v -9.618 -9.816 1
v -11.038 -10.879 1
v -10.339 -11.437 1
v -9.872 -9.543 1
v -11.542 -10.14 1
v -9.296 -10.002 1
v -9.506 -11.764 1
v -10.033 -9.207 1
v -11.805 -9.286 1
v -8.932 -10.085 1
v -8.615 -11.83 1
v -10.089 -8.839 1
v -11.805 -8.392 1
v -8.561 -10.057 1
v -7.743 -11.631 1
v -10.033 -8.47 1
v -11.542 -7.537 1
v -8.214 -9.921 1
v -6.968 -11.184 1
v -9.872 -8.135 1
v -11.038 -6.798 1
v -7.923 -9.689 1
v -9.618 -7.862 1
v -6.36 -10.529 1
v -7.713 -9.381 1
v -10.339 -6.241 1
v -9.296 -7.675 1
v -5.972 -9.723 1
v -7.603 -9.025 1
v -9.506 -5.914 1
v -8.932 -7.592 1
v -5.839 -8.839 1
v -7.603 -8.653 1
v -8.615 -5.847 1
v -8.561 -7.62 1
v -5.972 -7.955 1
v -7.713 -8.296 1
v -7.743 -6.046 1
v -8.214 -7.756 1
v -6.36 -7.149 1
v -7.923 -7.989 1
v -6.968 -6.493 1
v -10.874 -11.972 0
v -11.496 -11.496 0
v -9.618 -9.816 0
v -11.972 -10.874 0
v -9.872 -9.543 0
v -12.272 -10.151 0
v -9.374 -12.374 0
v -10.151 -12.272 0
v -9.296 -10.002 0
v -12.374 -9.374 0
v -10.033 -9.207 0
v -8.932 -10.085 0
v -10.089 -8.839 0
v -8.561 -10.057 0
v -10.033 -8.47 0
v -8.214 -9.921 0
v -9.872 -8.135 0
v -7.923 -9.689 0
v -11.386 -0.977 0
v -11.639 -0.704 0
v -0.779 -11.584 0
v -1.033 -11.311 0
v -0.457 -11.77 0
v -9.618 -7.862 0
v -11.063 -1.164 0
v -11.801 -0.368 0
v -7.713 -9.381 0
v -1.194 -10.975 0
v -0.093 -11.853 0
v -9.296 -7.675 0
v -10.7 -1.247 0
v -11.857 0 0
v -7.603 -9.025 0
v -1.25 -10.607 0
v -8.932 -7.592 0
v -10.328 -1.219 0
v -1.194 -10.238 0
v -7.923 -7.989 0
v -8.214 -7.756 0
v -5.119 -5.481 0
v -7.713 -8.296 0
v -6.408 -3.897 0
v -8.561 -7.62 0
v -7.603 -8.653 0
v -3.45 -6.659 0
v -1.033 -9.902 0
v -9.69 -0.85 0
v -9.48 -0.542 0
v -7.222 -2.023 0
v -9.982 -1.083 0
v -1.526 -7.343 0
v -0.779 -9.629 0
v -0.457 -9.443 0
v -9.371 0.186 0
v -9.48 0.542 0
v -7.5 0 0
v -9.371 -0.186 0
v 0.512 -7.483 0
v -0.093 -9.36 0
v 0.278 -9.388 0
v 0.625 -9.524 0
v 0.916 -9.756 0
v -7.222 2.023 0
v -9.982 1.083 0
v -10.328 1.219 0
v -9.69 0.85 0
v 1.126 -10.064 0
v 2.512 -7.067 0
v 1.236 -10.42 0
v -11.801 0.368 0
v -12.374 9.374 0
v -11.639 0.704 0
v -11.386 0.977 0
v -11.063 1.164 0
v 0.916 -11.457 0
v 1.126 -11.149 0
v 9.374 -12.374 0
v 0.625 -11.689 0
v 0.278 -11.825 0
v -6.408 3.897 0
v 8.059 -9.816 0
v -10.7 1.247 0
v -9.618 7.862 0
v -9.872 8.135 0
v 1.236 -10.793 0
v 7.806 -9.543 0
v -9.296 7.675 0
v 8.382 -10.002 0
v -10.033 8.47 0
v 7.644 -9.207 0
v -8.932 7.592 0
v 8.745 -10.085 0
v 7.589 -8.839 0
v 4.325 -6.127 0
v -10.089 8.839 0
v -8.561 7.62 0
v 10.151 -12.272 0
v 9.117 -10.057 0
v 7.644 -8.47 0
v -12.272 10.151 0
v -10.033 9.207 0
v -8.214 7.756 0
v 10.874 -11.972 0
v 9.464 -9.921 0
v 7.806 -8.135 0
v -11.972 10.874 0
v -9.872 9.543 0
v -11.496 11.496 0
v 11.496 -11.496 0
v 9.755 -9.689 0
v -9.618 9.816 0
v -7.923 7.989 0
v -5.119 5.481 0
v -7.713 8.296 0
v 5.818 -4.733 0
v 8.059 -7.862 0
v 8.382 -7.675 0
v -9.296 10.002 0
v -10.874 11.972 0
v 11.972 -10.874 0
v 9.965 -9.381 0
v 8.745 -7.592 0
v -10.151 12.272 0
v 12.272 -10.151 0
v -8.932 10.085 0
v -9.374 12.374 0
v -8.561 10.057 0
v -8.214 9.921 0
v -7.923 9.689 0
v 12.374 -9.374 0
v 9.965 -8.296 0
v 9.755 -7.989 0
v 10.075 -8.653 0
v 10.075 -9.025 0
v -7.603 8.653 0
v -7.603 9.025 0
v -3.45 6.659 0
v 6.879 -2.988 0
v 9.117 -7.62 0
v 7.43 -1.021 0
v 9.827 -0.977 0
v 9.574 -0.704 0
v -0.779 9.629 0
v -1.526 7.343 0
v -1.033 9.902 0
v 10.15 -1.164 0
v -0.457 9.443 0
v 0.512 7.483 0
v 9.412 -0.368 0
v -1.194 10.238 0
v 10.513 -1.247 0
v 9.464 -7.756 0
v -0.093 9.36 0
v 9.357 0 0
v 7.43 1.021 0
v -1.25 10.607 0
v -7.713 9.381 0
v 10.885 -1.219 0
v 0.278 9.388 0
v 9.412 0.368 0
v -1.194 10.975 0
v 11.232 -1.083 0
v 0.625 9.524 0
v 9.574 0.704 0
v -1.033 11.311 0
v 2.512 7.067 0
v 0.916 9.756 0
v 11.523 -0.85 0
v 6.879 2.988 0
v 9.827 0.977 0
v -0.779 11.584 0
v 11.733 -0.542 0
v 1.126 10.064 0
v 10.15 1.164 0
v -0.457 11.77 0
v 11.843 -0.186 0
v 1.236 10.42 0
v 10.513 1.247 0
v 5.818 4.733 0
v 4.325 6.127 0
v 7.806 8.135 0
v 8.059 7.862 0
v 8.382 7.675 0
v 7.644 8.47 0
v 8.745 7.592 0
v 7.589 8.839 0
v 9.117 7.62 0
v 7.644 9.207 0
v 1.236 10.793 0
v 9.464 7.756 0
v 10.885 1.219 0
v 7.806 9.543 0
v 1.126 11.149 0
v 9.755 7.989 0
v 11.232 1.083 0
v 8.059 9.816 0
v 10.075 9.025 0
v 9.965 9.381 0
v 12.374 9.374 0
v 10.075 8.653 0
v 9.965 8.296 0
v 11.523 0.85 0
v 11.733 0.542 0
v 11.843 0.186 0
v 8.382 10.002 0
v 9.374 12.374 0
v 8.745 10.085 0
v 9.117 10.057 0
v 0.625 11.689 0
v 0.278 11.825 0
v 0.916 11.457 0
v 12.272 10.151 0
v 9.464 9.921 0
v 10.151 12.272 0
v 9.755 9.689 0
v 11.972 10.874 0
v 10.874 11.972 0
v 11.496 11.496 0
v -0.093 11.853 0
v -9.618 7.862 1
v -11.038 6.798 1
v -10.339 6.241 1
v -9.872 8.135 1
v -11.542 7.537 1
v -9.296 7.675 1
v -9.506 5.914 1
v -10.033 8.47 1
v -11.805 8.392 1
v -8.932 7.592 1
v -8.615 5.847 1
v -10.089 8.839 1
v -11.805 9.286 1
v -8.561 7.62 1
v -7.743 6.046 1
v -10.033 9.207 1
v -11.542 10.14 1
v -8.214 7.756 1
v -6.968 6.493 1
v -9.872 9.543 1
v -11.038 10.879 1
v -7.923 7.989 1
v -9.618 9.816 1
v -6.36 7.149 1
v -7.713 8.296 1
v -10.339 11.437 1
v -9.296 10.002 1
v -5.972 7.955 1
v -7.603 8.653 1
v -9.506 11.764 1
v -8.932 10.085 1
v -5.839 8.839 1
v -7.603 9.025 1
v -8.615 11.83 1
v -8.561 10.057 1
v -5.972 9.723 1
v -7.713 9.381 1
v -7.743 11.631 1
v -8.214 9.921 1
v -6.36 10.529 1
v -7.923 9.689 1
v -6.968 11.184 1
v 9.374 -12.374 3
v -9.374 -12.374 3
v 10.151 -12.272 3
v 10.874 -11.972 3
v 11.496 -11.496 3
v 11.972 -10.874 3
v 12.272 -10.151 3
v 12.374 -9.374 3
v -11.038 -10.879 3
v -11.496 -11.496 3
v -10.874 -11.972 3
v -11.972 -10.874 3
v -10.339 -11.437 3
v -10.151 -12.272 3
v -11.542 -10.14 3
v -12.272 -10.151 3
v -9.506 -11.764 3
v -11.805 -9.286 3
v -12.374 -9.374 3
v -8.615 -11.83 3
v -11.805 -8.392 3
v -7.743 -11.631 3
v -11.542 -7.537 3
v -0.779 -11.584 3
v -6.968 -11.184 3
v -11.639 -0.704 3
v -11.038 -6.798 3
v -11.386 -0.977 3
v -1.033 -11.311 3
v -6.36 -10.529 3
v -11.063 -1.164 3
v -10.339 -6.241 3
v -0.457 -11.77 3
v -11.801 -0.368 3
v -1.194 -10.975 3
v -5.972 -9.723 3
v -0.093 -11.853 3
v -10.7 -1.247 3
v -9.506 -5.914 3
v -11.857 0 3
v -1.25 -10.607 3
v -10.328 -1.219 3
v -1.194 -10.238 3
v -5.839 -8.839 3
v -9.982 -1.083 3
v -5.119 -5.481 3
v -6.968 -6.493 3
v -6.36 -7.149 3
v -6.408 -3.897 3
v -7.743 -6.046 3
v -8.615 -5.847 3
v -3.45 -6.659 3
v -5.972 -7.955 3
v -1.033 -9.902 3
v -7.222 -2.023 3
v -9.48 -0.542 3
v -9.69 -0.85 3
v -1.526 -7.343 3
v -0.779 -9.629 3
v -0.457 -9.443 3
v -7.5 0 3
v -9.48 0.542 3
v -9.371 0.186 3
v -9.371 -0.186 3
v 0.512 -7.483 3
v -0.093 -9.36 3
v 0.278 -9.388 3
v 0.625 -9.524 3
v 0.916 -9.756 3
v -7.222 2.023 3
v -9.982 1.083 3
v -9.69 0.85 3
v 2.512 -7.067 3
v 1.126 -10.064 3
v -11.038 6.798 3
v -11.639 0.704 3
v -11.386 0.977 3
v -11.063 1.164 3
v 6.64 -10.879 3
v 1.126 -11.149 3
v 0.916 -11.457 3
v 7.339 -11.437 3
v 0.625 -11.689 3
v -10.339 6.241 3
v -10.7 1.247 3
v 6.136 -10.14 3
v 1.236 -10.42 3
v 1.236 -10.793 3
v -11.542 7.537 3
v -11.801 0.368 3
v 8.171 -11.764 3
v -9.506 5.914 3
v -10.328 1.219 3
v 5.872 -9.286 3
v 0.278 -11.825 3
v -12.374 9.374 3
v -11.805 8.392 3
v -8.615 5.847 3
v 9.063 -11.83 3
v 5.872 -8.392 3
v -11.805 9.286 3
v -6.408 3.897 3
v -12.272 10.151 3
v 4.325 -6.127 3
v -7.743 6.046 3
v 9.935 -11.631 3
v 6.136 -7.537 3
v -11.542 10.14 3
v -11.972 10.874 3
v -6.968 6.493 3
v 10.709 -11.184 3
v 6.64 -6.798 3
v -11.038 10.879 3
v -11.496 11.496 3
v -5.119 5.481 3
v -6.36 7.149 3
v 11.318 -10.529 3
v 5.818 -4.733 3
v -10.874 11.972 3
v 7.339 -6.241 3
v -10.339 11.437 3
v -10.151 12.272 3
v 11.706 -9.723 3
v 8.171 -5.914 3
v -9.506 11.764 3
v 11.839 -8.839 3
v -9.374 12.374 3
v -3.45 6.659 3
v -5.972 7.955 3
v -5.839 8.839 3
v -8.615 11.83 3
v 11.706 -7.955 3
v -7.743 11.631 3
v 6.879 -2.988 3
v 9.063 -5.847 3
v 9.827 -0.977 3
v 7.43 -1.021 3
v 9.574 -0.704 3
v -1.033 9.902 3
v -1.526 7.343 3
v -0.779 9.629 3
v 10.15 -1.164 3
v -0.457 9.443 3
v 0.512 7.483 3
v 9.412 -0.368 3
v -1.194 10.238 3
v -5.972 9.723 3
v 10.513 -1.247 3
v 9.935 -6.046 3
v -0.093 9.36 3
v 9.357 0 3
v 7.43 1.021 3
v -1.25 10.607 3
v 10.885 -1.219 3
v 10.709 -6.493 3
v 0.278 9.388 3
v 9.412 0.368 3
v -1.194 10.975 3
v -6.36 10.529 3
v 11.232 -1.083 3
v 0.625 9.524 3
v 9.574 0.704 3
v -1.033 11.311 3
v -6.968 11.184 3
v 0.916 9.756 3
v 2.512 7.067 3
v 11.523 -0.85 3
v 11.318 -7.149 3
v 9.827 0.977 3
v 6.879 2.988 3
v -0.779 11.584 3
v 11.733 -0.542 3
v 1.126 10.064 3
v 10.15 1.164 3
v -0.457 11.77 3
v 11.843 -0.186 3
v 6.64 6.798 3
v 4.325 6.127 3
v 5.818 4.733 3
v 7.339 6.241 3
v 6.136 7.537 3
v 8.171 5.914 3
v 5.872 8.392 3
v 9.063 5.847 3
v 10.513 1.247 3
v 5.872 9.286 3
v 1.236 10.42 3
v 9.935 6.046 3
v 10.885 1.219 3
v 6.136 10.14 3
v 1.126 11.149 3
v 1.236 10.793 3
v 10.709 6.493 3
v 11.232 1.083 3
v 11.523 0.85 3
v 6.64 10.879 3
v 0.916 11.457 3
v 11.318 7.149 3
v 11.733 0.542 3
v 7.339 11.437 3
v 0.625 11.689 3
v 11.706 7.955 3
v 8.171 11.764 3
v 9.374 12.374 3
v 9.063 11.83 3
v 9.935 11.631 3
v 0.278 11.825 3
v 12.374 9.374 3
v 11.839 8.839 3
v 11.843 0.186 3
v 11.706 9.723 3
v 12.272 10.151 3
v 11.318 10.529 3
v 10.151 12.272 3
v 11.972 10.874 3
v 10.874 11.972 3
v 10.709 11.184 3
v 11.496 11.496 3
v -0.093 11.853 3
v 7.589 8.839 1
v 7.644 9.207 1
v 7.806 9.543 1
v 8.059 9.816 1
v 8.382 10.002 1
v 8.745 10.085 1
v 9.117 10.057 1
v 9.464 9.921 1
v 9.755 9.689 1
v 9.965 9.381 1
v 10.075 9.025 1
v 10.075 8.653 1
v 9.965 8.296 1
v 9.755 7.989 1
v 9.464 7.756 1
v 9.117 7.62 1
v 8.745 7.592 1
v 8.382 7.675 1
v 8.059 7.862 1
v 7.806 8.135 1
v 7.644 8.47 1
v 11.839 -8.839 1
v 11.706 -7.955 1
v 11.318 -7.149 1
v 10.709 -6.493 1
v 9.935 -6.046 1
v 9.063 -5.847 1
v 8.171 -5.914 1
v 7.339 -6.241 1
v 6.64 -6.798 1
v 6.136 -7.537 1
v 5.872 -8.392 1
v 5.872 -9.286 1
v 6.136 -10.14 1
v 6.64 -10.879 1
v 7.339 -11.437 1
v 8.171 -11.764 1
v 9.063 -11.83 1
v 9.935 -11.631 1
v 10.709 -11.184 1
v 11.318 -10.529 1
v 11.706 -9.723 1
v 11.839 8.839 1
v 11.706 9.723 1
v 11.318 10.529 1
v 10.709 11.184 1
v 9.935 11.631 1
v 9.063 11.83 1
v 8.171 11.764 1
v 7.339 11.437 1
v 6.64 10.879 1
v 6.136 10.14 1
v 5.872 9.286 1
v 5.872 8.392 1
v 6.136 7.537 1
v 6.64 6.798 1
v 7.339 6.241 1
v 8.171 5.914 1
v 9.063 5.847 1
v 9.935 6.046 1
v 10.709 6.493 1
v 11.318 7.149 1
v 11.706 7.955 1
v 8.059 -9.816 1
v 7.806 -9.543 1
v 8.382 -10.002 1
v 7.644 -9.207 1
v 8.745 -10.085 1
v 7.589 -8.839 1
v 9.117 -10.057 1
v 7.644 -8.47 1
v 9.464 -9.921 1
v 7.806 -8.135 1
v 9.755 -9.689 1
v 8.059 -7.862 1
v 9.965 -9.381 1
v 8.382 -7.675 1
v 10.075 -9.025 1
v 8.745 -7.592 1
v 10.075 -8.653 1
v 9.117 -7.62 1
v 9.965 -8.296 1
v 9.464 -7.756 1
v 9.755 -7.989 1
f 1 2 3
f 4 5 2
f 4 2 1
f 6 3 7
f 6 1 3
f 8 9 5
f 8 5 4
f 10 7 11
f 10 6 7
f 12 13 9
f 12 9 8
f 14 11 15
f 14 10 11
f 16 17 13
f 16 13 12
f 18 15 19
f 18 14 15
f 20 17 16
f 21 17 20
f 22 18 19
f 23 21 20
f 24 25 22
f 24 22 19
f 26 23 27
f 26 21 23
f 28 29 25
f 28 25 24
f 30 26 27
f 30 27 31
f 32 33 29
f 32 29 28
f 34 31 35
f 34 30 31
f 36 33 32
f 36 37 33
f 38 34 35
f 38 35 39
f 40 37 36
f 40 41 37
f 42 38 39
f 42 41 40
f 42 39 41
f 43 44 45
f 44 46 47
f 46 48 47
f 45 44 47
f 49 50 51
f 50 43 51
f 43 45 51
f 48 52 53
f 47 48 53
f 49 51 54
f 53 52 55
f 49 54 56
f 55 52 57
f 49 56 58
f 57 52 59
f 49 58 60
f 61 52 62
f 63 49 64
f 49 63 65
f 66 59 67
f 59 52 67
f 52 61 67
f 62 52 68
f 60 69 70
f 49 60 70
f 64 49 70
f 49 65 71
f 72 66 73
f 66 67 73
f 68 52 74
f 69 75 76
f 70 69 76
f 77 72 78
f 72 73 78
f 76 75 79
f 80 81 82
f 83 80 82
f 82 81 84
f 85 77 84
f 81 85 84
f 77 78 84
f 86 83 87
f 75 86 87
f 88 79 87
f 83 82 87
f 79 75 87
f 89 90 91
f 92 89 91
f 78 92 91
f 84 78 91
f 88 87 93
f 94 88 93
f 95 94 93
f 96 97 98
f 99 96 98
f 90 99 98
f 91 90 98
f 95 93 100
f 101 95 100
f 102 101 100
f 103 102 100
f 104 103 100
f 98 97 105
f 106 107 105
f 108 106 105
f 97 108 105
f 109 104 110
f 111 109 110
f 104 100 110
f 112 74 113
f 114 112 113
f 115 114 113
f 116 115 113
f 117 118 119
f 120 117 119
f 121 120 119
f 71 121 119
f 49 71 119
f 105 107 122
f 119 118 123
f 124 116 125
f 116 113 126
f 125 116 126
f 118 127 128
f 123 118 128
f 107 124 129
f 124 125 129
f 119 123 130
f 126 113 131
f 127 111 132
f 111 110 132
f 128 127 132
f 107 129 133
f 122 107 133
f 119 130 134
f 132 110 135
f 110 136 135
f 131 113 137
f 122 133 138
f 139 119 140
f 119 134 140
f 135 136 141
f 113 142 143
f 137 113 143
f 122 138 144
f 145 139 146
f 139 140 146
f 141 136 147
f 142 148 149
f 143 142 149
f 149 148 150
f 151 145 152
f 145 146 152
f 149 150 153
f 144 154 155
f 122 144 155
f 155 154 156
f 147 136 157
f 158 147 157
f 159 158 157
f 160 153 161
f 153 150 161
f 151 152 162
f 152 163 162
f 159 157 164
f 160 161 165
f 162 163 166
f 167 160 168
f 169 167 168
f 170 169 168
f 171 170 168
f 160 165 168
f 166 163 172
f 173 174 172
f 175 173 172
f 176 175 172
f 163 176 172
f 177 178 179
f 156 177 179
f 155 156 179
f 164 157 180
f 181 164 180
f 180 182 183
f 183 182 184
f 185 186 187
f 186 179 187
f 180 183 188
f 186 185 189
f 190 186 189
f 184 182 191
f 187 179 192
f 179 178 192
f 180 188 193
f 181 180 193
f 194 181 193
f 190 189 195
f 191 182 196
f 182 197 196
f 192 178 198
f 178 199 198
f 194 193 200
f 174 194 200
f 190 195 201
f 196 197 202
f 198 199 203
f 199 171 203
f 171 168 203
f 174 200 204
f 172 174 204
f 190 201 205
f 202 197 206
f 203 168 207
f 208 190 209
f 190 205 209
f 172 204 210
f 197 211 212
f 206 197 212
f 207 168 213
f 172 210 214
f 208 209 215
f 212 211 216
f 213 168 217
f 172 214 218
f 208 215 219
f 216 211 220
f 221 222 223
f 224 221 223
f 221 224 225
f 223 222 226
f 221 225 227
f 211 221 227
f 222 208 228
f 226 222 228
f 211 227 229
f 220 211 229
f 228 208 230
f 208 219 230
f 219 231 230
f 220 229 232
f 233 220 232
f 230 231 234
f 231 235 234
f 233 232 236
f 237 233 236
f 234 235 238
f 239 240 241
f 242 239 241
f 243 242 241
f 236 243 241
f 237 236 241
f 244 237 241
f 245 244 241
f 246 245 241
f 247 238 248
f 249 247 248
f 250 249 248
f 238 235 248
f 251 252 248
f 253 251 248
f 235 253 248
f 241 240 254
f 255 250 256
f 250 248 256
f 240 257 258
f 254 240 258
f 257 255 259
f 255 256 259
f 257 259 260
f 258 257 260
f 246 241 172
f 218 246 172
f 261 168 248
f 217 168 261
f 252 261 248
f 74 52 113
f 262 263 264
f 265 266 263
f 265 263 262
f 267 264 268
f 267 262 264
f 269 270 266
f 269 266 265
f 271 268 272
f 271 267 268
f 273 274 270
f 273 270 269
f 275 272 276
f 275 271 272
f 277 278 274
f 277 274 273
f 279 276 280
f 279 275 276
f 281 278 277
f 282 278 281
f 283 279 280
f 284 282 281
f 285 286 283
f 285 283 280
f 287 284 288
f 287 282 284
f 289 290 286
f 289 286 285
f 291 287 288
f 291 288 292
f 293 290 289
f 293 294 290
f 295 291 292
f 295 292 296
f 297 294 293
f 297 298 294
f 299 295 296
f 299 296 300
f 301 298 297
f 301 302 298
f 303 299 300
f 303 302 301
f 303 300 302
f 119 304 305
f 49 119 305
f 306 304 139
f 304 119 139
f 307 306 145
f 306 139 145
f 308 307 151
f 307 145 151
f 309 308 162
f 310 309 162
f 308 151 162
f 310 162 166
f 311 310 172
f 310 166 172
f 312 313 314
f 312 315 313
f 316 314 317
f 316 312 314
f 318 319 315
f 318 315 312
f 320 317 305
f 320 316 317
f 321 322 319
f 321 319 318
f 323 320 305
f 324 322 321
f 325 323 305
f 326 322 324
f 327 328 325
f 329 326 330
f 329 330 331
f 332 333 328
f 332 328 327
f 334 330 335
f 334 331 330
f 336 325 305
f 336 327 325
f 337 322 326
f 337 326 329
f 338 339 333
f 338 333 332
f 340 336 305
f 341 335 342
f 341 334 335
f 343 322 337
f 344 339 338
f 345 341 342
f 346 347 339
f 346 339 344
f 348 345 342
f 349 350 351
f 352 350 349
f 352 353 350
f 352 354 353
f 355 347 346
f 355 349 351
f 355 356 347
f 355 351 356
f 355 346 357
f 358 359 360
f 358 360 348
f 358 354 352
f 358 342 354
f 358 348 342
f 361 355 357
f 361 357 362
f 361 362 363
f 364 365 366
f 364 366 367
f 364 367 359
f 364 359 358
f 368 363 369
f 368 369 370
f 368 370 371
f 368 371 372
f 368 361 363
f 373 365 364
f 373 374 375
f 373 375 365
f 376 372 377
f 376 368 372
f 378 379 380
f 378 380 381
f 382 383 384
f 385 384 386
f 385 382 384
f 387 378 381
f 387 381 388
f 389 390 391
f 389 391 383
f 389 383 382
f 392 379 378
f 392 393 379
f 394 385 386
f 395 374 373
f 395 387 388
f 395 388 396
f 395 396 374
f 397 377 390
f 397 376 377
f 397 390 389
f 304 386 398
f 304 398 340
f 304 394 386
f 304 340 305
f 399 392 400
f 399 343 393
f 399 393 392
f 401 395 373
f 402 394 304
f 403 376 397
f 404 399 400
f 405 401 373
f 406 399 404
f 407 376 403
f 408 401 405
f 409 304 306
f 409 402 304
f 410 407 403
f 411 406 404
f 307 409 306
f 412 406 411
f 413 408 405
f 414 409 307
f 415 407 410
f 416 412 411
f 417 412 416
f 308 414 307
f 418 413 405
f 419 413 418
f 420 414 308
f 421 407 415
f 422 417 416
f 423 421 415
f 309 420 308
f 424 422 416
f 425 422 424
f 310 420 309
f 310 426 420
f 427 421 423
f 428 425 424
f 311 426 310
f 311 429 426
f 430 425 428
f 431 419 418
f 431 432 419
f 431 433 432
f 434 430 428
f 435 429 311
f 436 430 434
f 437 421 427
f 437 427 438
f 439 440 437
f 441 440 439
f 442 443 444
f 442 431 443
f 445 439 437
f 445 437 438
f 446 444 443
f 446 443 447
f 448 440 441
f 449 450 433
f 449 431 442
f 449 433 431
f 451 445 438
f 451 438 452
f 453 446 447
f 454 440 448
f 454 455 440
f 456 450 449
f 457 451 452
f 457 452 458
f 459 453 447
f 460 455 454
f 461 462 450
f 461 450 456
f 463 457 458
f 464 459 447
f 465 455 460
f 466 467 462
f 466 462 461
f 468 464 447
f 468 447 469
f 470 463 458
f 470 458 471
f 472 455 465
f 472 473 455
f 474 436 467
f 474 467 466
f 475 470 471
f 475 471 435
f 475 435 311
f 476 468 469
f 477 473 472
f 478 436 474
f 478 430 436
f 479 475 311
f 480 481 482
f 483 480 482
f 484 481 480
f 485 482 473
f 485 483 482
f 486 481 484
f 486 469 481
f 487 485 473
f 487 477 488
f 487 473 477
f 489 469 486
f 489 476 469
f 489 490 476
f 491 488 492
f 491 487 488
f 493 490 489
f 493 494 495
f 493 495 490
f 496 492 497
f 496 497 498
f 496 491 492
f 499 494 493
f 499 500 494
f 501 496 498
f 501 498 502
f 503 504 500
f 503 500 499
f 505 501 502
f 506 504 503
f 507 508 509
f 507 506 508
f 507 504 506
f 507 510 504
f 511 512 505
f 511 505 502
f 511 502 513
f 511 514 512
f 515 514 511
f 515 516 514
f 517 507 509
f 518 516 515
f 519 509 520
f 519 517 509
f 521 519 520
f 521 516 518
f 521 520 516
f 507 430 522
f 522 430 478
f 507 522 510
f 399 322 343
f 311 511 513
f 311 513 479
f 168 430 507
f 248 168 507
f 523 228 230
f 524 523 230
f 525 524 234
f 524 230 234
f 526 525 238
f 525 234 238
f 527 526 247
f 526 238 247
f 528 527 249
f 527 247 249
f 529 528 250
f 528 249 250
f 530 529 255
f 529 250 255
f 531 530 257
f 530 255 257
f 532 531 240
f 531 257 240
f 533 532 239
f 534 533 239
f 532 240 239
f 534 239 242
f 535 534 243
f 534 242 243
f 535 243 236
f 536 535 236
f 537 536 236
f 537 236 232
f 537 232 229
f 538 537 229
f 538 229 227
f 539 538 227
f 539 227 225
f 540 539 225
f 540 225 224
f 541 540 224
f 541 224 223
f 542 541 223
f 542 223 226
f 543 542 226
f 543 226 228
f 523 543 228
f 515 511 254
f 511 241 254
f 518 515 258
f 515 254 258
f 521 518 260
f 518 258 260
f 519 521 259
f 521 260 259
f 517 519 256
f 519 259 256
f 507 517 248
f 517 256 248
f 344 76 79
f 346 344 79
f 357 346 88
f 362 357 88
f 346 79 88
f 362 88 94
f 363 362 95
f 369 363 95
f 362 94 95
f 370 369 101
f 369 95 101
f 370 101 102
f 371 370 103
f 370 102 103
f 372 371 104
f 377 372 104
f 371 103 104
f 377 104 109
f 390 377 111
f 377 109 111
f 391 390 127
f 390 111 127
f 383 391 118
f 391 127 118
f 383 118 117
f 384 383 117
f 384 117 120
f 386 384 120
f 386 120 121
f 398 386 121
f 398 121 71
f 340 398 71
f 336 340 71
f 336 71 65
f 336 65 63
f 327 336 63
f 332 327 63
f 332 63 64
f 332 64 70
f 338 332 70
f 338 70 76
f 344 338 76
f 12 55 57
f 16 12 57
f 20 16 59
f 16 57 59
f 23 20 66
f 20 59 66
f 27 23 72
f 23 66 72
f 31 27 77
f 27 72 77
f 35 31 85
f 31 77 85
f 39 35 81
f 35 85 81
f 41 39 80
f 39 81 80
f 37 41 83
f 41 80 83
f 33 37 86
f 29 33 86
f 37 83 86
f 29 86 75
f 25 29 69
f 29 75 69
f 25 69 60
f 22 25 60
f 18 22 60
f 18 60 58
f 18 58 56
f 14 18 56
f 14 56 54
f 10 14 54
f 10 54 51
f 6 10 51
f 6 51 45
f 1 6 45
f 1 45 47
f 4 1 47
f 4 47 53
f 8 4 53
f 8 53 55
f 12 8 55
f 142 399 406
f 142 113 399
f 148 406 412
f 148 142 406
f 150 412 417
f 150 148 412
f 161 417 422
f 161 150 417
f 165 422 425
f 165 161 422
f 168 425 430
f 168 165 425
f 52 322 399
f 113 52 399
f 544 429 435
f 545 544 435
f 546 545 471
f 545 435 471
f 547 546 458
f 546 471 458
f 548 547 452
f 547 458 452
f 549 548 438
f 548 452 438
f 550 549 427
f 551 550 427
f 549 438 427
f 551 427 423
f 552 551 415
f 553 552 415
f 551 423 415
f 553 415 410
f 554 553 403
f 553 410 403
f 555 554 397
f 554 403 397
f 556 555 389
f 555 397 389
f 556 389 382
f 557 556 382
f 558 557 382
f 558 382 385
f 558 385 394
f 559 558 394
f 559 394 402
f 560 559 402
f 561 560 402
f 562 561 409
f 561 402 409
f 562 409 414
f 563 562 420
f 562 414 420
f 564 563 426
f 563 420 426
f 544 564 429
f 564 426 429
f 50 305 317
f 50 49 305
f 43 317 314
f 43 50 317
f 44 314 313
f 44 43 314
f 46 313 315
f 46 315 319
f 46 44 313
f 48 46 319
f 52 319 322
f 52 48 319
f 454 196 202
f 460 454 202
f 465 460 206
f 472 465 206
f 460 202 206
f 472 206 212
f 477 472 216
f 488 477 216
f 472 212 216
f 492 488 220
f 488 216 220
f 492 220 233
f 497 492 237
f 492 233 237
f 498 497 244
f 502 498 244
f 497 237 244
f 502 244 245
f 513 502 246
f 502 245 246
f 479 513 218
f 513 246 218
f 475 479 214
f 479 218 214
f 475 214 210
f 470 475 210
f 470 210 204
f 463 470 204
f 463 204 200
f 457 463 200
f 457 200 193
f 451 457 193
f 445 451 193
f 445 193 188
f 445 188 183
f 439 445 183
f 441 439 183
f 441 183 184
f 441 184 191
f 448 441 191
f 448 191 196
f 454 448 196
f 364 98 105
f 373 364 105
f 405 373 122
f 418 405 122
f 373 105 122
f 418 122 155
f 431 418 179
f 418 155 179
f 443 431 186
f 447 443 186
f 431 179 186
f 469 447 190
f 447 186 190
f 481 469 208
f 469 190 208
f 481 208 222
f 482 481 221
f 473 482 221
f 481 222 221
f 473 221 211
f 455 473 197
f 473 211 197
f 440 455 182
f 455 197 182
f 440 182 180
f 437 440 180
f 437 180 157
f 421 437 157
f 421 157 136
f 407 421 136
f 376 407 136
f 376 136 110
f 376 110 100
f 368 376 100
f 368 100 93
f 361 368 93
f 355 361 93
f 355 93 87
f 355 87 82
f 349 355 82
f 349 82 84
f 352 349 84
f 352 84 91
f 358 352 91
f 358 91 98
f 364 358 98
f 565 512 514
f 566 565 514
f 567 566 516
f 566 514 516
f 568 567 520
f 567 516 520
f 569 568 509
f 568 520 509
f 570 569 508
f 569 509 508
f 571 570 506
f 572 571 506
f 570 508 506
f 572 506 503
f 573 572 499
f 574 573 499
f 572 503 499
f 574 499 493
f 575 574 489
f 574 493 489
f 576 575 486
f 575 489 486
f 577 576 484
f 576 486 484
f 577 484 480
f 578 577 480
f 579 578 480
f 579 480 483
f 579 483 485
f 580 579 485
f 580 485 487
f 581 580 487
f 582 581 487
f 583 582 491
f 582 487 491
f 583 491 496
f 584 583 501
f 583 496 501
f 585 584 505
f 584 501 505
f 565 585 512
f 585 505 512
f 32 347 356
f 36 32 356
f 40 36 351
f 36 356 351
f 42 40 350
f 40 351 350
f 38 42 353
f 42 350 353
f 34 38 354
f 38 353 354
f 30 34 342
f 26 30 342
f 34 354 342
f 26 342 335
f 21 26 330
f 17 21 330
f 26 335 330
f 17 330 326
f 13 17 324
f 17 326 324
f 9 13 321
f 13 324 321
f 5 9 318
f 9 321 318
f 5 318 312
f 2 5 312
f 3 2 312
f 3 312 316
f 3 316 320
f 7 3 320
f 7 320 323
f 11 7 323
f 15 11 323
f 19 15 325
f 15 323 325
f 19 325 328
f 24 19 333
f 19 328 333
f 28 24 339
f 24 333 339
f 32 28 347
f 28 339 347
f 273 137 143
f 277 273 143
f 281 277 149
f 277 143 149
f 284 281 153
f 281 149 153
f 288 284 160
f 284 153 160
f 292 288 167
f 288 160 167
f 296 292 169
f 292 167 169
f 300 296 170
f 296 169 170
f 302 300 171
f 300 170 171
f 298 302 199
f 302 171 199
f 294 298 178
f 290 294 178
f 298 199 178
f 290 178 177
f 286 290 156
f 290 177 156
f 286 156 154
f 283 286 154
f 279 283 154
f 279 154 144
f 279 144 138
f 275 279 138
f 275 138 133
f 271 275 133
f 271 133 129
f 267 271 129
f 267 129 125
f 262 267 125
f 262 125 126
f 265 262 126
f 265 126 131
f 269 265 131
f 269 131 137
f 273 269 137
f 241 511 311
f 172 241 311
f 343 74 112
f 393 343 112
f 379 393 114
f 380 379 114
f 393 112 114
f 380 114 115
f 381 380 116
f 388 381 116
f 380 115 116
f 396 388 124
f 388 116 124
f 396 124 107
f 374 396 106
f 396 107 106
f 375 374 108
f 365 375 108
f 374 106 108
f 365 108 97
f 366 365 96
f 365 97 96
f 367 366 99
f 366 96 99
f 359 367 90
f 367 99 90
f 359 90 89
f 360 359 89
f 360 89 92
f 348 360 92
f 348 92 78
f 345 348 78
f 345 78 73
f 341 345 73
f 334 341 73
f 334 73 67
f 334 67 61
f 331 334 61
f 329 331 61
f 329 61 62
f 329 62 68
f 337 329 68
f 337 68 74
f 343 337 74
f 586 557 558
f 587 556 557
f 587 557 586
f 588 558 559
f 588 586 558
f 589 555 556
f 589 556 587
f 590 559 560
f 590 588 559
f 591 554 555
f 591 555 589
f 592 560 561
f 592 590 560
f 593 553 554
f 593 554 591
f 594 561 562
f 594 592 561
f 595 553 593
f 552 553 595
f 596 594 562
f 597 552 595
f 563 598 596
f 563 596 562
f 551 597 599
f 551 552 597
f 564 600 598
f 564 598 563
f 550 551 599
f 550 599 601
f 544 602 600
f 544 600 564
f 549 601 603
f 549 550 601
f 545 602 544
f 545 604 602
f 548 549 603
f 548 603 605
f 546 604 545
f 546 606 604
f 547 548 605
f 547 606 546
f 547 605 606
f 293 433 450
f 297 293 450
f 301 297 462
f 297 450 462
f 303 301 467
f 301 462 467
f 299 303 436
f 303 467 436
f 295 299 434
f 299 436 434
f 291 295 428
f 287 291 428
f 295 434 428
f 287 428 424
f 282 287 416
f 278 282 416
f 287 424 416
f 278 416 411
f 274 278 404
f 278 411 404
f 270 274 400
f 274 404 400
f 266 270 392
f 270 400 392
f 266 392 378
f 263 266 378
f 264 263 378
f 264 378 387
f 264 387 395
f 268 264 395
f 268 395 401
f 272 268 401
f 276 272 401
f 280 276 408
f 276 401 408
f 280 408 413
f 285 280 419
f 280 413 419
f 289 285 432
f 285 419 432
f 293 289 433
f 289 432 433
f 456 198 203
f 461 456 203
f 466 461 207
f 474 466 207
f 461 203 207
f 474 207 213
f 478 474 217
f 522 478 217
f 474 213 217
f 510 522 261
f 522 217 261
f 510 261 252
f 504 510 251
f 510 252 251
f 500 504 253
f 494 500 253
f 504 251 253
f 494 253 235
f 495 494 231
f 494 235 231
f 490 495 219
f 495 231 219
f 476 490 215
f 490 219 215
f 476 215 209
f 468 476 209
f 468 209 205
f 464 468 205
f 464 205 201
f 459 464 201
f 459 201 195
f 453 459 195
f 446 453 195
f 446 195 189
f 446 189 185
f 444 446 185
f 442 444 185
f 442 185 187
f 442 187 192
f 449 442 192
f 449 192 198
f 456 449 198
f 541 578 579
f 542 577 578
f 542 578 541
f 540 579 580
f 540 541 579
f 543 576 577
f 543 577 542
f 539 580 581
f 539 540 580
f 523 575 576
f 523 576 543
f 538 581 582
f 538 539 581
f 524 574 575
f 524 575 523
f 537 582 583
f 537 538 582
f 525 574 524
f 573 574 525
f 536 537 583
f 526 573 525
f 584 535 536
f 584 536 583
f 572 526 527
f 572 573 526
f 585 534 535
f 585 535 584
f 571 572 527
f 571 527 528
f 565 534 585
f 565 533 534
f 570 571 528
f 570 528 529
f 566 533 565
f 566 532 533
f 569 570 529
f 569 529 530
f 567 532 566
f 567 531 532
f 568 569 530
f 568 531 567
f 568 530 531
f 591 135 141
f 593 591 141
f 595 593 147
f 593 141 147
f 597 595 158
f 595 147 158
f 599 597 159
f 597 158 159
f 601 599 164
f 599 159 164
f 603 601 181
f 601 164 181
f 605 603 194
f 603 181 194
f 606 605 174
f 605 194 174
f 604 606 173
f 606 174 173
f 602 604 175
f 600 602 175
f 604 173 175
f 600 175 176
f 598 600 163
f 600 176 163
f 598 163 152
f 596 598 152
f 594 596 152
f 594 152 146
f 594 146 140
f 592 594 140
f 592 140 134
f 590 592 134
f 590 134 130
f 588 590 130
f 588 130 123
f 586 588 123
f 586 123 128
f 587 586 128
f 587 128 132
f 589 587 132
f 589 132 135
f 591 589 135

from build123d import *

# Parameters (mm, degrees)
SKETCH_1_R          = 17.5
EXTRUDE_1_DEPTH     = 3
CUT_EXTRUDE_1_REACH = 26.93
SKETCH_2_R          = 1.25
CUT_EXTRUDE_2_REACH = 26.93
SKETCH_3_R          = 1.25
CUT_EXTRUDE_3_REACH = 26.93
SKETCH_4_R          = 7.5
CUT_EXTRUDE_4_REACH = 26.93
FILLET_1_R          = 3
SKETCH_8_R          = 3
CUT_EXTRUDE_5_DEPTH = 2


with BuildPart() as part:
    # 草图1 → 凸台-拉伸1 (new body)
    with BuildSketch(Plane.XY):
        Circle(SKETCH_1_R)
    extrude(amount=EXTRUDE_1_DEPTH)

    # 草图2 → 切除-拉伸1 (cut, up to next)
    with BuildSketch(Plane(origin=(0, 0, 0), x_dir=(-1, 0, 0), z_dir=(0, 0, -1)), mode=Mode.PRIVATE) as cut_extrude_1_sk1:
        with Locations((-8.838834765, 8.838834765)):
            Circle(SKETCH_2_R)
    cut_extrude_1_tool1 = extrude(cut_extrude_1_sk1.sketch, amount=-CUT_EXTRUDE_1_REACH, mode=Mode.PRIVATE) & part.part
    # 草图2 → 切除-拉伸1 (cut, up to next)
    with BuildSketch(Plane(origin=(0, 0, 0), x_dir=(-1, 0, 0), z_dir=(0, 0, -1)), mode=Mode.PRIVATE) as cut_extrude_1_sk2:
        with Locations((8.838834765, 8.838834765)):
            Circle(SKETCH_2_R)
    cut_extrude_1_tool2 = extrude(cut_extrude_1_sk2.sketch, amount=-CUT_EXTRUDE_1_REACH, mode=Mode.PRIVATE) & part.part
    # 草图2 → 切除-拉伸1 (cut, up to next)
    with BuildSketch(Plane(origin=(0, 0, 0), x_dir=(-1, 0, 0), z_dir=(0, 0, -1)), mode=Mode.PRIVATE) as cut_extrude_1_sk3:
        with Locations((8.838834765, -8.838834765)):
            Circle(SKETCH_2_R)
    cut_extrude_1_tool3 = extrude(cut_extrude_1_sk3.sketch, amount=-CUT_EXTRUDE_1_REACH, mode=Mode.PRIVATE) & part.part
    # 草图2 → 切除-拉伸1 (cut, up to next)
    with BuildSketch(Plane(origin=(0, 0, 0), x_dir=(-1, 0, 0), z_dir=(0, 0, -1)), mode=Mode.PRIVATE) as cut_extrude_1_sk4:
        with Locations((-8.838834765, -8.838834765)):
            Circle(SKETCH_2_R)
    cut_extrude_1_tool4 = extrude(cut_extrude_1_sk4.sketch, amount=-CUT_EXTRUDE_1_REACH, mode=Mode.PRIVATE) & part.part
    add(cut_extrude_1_tool1.solids().sort_by_distance((8.838835, 8.838835, 0))[0], mode=Mode.SUBTRACT)
    add(cut_extrude_1_tool2.solids().sort_by_distance((-8.838835, 8.838835, 0))[0], mode=Mode.SUBTRACT)
    add(cut_extrude_1_tool3.solids().sort_by_distance((-8.838835, -8.838835, 0))[0], mode=Mode.SUBTRACT)
    add(cut_extrude_1_tool4.solids().sort_by_distance((8.838835, -8.838835, 0))[0], mode=Mode.SUBTRACT)

    # 草图3 → 切除-拉伸2 (cut, up to next)
    with BuildSketch(Plane(origin=(0, 0, 0), x_dir=(-1, 0, 0), z_dir=(0, 0, -1)), mode=Mode.PRIVATE) as cut_extrude_2_sk1:
        with Locations((0, 10.606601718)):
            Circle(SKETCH_3_R)
    cut_extrude_2_tool1 = extrude(cut_extrude_2_sk1.sketch, amount=-CUT_EXTRUDE_2_REACH, mode=Mode.PRIVATE) & part.part
    # 草图3 → 切除-拉伸2 (cut, up to next)
    with BuildSketch(Plane(origin=(0, 0, 0), x_dir=(-1, 0, 0), z_dir=(0, 0, -1)), mode=Mode.PRIVATE) as cut_extrude_2_sk2:
        with Locations((-10.606601718, 0)):
            Circle(SKETCH_3_R)
    cut_extrude_2_tool2 = extrude(cut_extrude_2_sk2.sketch, amount=-CUT_EXTRUDE_2_REACH, mode=Mode.PRIVATE) & part.part
    # 草图3 → 切除-拉伸2 (cut, up to next)
    with BuildSketch(Plane(origin=(0, 0, 0), x_dir=(-1, 0, 0), z_dir=(0, 0, -1)), mode=Mode.PRIVATE) as cut_extrude_2_sk3:
        with Locations((0, -10.606601718)):
            Circle(SKETCH_3_R)
    cut_extrude_2_tool3 = extrude(cut_extrude_2_sk3.sketch, amount=-CUT_EXTRUDE_2_REACH, mode=Mode.PRIVATE) & part.part
    # 草图3 → 切除-拉伸2 (cut, up to next)
    with BuildSketch(Plane(origin=(0, 0, 0), x_dir=(-1, 0, 0), z_dir=(0, 0, -1)), mode=Mode.PRIVATE) as cut_extrude_2_sk4:
        with Locations((10.606601718, 0)):
            Circle(SKETCH_3_R)
    cut_extrude_2_tool4 = extrude(cut_extrude_2_sk4.sketch, amount=-CUT_EXTRUDE_2_REACH, mode=Mode.PRIVATE) & part.part
    add(cut_extrude_2_tool1.solids().sort_by_distance((0, 10.606602, 0))[0], mode=Mode.SUBTRACT)
    add(cut_extrude_2_tool2.solids().sort_by_distance((10.606602, 0, 0))[0], mode=Mode.SUBTRACT)
    add(cut_extrude_2_tool3.solids().sort_by_distance((0, -10.606602, 0))[0], mode=Mode.SUBTRACT)
    add(cut_extrude_2_tool4.solids().sort_by_distance((-10.606602, 0, 0))[0], mode=Mode.SUBTRACT)

    # 草图4 → 切除-拉伸3 (cut, up to next)
    with BuildSketch(Plane(origin=(0, 0, 0), x_dir=(-1, 0, 0), z_dir=(0, 0, -1)), mode=Mode.PRIVATE) as cut_extrude_3_sk1:
        Circle(SKETCH_4_R)
    cut_extrude_3_tool1 = extrude(cut_extrude_3_sk1.sketch, amount=-CUT_EXTRUDE_3_REACH, mode=Mode.PRIVATE) & part.part
    add(cut_extrude_3_tool1.solids().sort_by_distance((0, 0, 0))[0], mode=Mode.SUBTRACT)

    # 草图7 → 切除-拉伸4 (cut, up to next)
    with BuildSketch(Plane.XY.offset(3), mode=Mode.PRIVATE) as cut_extrude_4_sk1:
        with BuildLine():
            Line((-12.374368671, 12.374368671), (12.374368671, 12.374368671))
            ThreePointArc((12.374368671, 12.374368671), (0, 17.5), (-12.374368671, 12.374368671))
        make_face()
    cut_extrude_4_tool1 = extrude(cut_extrude_4_sk1.sketch, amount=-CUT_EXTRUDE_4_REACH, mode=Mode.PRIVATE) & part.part
    # 草图7 → 切除-拉伸4 (cut, up to next)
    with BuildSketch(Plane.XY.offset(3), mode=Mode.PRIVATE) as cut_extrude_4_sk2:
        with BuildLine():
            Line((12.374368671, 12.374368671), (12.374368671, -12.374368671))
            ThreePointArc((12.374368671, -12.374368671), (16.167891819, -6.696960066), (17.5, 0))
            ThreePointArc((17.5, 0), (16.167891819, 6.696960066), (12.374368671, 12.374368671))
        make_face()
    cut_extrude_4_tool2 = extrude(cut_extrude_4_sk2.sketch, amount=-CUT_EXTRUDE_4_REACH, mode=Mode.PRIVATE) & part.part
    # 草图7 → 切除-拉伸4 (cut, up to next)
    with BuildSketch(Plane.XY.offset(3), mode=Mode.PRIVATE) as cut_extrude_4_sk3:
        with BuildLine():
            ThreePointArc((-12.374368671, -12.374368671), (0, -17.5), (12.374368671, -12.374368671))
            Line((12.374368671, -12.374368671), (-12.374368671, -12.374368671))
        make_face()
    cut_extrude_4_tool3 = extrude(cut_extrude_4_sk3.sketch, amount=-CUT_EXTRUDE_4_REACH, mode=Mode.PRIVATE) & part.part
    # 草图7 → 切除-拉伸4 (cut, up to next)
    with BuildSketch(Plane.XY.offset(3), mode=Mode.PRIVATE) as cut_extrude_4_sk4:
        with BuildLine():
            ThreePointArc((-12.374368671, 12.374368671), (-17.5, 0), (-12.374368671, -12.374368671))
            Line((-12.374368671, -12.374368671), (-12.374368671, 12.374368671))
        make_face()
    cut_extrude_4_tool4 = extrude(cut_extrude_4_sk4.sketch, amount=-CUT_EXTRUDE_4_REACH, mode=Mode.PRIVATE) & part.part
    add(cut_extrude_4_tool1.solids().sort_by_distance((0, 14.452754, 3))[0], mode=Mode.SUBTRACT)
    add(cut_extrude_4_tool2.solids().sort_by_distance((14.452754, 0, 3))[0], mode=Mode.SUBTRACT)
    add(cut_extrude_4_tool3.solids().sort_by_distance((0, -14.452754, 3))[0], mode=Mode.SUBTRACT)
    add(cut_extrude_4_tool4.solids().sort_by_distance((-14.452754, 0, 3))[0], mode=Mode.SUBTRACT)

    # 圆角1
    fillet_1_edges = [part.edges().sort_by_distance(p)[0] for p in [
        (12.374368671, 12.374368671, 1.5),
        (-12.374368671, 12.374368671, 1.5),
        (-12.374368671, -12.374368671, 1.5),
        (12.374368671, -12.374368671, 1.5),
    ]]
    fillet(fillet_1_edges, radius=FILLET_1_R)

    # 草图8 → 切除-拉伸5 (cut)
    with BuildSketch(Plane.XY.offset(3)):
        with Locations((-8.838834765, 8.838834765)):
            Circle(SKETCH_8_R)
        with Locations((8.838834765, 8.838834765)):
            Circle(SKETCH_8_R)
        with Locations((8.838834765, -8.838834765)):
            Circle(SKETCH_8_R)
        with Locations((-8.838834765, -8.838834765)):
            Circle(SKETCH_8_R)
    extrude(amount=-CUT_EXTRUDE_5_DEPTH, mode=Mode.SUBTRACT)


solid = part.part
